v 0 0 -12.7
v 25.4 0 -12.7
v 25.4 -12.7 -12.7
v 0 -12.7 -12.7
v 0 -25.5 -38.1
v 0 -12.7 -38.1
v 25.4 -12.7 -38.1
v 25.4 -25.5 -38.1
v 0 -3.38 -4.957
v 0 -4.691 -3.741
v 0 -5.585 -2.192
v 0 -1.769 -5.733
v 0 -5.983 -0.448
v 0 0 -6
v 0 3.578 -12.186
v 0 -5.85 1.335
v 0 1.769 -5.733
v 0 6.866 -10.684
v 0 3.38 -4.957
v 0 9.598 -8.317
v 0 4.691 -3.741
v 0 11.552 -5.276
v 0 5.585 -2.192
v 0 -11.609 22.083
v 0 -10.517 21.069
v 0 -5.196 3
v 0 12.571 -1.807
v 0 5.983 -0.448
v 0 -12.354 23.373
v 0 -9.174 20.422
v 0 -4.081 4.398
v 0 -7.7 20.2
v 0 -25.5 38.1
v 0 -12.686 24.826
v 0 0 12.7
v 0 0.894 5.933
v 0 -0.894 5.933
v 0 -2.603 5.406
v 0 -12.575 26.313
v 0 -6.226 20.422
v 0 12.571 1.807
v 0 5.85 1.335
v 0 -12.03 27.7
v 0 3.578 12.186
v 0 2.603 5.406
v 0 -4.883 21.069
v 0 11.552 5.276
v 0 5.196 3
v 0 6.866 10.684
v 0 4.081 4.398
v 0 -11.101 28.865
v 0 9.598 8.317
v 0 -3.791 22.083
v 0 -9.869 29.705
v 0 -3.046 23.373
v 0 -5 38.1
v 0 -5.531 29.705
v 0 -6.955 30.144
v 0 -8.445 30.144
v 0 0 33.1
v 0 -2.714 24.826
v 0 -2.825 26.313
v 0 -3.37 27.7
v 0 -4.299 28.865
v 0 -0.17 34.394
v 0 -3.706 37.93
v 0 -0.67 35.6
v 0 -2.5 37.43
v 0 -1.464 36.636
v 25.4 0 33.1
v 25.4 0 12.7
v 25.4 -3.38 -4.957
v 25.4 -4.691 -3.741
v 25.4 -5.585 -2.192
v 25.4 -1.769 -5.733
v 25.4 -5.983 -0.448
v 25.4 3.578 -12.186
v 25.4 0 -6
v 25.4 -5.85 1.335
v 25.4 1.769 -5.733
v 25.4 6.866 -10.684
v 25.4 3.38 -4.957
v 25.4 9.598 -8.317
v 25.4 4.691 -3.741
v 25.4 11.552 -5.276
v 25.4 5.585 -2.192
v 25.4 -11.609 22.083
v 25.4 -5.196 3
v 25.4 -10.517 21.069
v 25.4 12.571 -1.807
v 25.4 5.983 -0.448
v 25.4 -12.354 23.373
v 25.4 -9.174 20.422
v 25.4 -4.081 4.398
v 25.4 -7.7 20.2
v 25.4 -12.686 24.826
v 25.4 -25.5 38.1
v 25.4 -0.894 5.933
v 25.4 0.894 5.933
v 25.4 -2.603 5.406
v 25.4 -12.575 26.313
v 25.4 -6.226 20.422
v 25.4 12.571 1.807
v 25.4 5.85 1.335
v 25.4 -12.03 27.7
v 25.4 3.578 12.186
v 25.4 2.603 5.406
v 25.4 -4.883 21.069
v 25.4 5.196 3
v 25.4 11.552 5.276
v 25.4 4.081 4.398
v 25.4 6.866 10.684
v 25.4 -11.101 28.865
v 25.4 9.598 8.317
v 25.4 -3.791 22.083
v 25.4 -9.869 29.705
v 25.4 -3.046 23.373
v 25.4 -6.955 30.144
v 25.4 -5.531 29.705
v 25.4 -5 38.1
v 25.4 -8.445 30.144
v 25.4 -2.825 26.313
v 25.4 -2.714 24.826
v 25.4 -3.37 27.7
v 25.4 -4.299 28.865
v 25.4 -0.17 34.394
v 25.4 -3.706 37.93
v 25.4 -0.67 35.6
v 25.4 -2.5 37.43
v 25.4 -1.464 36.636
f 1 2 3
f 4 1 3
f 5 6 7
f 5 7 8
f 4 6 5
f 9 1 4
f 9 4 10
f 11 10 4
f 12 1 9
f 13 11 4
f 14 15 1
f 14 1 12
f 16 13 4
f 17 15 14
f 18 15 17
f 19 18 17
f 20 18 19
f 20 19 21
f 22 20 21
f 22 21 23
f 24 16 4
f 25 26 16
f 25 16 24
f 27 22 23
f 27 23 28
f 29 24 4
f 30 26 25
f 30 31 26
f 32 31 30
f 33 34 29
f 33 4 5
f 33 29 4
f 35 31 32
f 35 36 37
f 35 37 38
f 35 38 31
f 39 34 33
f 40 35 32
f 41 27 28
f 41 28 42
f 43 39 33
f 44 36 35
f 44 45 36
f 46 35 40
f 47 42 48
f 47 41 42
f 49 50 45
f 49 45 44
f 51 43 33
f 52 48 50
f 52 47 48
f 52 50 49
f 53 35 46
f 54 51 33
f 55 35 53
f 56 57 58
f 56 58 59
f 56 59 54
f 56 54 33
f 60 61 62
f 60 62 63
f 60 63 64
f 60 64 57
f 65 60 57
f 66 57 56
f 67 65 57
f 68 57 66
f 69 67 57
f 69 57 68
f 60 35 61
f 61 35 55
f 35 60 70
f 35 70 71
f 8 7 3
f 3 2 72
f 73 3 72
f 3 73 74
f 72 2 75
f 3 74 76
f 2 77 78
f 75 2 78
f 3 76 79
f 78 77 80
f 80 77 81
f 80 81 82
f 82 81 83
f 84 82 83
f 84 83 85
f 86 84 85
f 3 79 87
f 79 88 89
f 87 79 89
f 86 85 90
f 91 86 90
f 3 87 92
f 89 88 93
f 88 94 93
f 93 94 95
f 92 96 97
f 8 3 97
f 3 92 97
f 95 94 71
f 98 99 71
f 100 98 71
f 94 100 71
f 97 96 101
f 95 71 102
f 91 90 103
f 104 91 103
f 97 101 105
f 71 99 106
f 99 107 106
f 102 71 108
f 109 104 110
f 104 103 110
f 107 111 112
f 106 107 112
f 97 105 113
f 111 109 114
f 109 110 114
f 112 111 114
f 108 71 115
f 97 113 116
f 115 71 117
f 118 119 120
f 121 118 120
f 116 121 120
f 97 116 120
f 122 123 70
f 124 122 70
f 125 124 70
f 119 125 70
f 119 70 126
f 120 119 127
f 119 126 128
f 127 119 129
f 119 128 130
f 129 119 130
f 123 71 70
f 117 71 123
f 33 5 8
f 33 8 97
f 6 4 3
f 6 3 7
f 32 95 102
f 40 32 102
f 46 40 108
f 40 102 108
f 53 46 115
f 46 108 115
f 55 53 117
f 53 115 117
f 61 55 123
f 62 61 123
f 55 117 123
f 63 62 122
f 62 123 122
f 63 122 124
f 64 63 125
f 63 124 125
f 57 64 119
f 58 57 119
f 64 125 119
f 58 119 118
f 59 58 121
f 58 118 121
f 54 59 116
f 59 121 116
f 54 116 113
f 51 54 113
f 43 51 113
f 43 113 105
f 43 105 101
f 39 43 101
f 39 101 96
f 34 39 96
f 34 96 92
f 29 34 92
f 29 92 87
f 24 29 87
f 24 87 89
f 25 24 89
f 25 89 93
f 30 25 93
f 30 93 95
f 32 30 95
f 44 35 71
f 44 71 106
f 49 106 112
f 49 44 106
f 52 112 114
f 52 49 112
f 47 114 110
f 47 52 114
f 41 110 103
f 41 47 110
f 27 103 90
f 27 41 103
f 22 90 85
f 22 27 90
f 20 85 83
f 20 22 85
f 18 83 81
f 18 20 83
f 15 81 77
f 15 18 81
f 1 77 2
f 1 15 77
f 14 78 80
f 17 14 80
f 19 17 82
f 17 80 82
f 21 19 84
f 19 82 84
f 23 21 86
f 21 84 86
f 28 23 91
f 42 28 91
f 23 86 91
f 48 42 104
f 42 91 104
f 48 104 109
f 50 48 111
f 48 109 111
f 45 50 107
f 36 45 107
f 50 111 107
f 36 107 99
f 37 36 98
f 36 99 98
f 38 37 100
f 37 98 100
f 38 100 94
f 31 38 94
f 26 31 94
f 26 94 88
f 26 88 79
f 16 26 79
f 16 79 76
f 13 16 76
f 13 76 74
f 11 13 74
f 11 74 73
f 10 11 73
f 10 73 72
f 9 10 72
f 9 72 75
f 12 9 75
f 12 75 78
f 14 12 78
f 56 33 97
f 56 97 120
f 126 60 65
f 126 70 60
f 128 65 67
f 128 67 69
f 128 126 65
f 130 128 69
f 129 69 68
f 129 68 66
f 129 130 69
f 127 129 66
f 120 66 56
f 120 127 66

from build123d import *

# Parameters (mm, degrees)
BOSS_EXTRUDE1_DEPTH = 25.4
SKETCH2_R           = 6
SKETCH2_R_2         = 5
CUT_EXTRUDE1_DEPTH  = 26.4
FILLET1_R           = 5


with BuildPart() as part:
    # Sketch1 → Boss-Extrude1 (new body)
    with BuildSketch(Plane(origin=(0, 0, 0), x_dir=(0, 0, -1), z_dir=(1, 0, 0))):
        with BuildLine():
            Line((12.7, 0), (12.7, -12.7))
            Line((12.7, -12.7), (38.1, -12.7))
            Line((38.1, -12.7), (38.1, -25.5))
            Line((38.1, -25.5), (-38.1, -25.5))
            Line((-38.1, -25.5), (-38.1, -12.7))
            Line((-38.1, -12.7), (-38.1, 0))
            Line((-38.1, 0), (-12.7, 0))
            ThreePointArc((-12.7, 0), (0, 12.7), (12.7, 0))
        make_face()
    extrude(amount=BOSS_EXTRUDE1_DEPTH)

    # Sketch2 → Cut-Extrude1 (cut, through all)
    with BuildSketch(Plane(origin=(25.4, 0, 0), x_dir=(0, 0, -1), z_dir=(1, 0, 0))):
        Circle(SKETCH2_R)
        with Locations((-25.2, -7.7)):
            Circle(SKETCH2_R_2)
    extrude(amount=-CUT_EXTRUDE1_DEPTH, mode=Mode.SUBTRACT)

    # Fillet1
    fillet1_edges = [part.edges().sort_by_distance(p)[0] for p in [
        (12.7, 0, 38.1),
    ]]
    fillet(fillet1_edges, radius=FILLET1_R)


solid = part.part
